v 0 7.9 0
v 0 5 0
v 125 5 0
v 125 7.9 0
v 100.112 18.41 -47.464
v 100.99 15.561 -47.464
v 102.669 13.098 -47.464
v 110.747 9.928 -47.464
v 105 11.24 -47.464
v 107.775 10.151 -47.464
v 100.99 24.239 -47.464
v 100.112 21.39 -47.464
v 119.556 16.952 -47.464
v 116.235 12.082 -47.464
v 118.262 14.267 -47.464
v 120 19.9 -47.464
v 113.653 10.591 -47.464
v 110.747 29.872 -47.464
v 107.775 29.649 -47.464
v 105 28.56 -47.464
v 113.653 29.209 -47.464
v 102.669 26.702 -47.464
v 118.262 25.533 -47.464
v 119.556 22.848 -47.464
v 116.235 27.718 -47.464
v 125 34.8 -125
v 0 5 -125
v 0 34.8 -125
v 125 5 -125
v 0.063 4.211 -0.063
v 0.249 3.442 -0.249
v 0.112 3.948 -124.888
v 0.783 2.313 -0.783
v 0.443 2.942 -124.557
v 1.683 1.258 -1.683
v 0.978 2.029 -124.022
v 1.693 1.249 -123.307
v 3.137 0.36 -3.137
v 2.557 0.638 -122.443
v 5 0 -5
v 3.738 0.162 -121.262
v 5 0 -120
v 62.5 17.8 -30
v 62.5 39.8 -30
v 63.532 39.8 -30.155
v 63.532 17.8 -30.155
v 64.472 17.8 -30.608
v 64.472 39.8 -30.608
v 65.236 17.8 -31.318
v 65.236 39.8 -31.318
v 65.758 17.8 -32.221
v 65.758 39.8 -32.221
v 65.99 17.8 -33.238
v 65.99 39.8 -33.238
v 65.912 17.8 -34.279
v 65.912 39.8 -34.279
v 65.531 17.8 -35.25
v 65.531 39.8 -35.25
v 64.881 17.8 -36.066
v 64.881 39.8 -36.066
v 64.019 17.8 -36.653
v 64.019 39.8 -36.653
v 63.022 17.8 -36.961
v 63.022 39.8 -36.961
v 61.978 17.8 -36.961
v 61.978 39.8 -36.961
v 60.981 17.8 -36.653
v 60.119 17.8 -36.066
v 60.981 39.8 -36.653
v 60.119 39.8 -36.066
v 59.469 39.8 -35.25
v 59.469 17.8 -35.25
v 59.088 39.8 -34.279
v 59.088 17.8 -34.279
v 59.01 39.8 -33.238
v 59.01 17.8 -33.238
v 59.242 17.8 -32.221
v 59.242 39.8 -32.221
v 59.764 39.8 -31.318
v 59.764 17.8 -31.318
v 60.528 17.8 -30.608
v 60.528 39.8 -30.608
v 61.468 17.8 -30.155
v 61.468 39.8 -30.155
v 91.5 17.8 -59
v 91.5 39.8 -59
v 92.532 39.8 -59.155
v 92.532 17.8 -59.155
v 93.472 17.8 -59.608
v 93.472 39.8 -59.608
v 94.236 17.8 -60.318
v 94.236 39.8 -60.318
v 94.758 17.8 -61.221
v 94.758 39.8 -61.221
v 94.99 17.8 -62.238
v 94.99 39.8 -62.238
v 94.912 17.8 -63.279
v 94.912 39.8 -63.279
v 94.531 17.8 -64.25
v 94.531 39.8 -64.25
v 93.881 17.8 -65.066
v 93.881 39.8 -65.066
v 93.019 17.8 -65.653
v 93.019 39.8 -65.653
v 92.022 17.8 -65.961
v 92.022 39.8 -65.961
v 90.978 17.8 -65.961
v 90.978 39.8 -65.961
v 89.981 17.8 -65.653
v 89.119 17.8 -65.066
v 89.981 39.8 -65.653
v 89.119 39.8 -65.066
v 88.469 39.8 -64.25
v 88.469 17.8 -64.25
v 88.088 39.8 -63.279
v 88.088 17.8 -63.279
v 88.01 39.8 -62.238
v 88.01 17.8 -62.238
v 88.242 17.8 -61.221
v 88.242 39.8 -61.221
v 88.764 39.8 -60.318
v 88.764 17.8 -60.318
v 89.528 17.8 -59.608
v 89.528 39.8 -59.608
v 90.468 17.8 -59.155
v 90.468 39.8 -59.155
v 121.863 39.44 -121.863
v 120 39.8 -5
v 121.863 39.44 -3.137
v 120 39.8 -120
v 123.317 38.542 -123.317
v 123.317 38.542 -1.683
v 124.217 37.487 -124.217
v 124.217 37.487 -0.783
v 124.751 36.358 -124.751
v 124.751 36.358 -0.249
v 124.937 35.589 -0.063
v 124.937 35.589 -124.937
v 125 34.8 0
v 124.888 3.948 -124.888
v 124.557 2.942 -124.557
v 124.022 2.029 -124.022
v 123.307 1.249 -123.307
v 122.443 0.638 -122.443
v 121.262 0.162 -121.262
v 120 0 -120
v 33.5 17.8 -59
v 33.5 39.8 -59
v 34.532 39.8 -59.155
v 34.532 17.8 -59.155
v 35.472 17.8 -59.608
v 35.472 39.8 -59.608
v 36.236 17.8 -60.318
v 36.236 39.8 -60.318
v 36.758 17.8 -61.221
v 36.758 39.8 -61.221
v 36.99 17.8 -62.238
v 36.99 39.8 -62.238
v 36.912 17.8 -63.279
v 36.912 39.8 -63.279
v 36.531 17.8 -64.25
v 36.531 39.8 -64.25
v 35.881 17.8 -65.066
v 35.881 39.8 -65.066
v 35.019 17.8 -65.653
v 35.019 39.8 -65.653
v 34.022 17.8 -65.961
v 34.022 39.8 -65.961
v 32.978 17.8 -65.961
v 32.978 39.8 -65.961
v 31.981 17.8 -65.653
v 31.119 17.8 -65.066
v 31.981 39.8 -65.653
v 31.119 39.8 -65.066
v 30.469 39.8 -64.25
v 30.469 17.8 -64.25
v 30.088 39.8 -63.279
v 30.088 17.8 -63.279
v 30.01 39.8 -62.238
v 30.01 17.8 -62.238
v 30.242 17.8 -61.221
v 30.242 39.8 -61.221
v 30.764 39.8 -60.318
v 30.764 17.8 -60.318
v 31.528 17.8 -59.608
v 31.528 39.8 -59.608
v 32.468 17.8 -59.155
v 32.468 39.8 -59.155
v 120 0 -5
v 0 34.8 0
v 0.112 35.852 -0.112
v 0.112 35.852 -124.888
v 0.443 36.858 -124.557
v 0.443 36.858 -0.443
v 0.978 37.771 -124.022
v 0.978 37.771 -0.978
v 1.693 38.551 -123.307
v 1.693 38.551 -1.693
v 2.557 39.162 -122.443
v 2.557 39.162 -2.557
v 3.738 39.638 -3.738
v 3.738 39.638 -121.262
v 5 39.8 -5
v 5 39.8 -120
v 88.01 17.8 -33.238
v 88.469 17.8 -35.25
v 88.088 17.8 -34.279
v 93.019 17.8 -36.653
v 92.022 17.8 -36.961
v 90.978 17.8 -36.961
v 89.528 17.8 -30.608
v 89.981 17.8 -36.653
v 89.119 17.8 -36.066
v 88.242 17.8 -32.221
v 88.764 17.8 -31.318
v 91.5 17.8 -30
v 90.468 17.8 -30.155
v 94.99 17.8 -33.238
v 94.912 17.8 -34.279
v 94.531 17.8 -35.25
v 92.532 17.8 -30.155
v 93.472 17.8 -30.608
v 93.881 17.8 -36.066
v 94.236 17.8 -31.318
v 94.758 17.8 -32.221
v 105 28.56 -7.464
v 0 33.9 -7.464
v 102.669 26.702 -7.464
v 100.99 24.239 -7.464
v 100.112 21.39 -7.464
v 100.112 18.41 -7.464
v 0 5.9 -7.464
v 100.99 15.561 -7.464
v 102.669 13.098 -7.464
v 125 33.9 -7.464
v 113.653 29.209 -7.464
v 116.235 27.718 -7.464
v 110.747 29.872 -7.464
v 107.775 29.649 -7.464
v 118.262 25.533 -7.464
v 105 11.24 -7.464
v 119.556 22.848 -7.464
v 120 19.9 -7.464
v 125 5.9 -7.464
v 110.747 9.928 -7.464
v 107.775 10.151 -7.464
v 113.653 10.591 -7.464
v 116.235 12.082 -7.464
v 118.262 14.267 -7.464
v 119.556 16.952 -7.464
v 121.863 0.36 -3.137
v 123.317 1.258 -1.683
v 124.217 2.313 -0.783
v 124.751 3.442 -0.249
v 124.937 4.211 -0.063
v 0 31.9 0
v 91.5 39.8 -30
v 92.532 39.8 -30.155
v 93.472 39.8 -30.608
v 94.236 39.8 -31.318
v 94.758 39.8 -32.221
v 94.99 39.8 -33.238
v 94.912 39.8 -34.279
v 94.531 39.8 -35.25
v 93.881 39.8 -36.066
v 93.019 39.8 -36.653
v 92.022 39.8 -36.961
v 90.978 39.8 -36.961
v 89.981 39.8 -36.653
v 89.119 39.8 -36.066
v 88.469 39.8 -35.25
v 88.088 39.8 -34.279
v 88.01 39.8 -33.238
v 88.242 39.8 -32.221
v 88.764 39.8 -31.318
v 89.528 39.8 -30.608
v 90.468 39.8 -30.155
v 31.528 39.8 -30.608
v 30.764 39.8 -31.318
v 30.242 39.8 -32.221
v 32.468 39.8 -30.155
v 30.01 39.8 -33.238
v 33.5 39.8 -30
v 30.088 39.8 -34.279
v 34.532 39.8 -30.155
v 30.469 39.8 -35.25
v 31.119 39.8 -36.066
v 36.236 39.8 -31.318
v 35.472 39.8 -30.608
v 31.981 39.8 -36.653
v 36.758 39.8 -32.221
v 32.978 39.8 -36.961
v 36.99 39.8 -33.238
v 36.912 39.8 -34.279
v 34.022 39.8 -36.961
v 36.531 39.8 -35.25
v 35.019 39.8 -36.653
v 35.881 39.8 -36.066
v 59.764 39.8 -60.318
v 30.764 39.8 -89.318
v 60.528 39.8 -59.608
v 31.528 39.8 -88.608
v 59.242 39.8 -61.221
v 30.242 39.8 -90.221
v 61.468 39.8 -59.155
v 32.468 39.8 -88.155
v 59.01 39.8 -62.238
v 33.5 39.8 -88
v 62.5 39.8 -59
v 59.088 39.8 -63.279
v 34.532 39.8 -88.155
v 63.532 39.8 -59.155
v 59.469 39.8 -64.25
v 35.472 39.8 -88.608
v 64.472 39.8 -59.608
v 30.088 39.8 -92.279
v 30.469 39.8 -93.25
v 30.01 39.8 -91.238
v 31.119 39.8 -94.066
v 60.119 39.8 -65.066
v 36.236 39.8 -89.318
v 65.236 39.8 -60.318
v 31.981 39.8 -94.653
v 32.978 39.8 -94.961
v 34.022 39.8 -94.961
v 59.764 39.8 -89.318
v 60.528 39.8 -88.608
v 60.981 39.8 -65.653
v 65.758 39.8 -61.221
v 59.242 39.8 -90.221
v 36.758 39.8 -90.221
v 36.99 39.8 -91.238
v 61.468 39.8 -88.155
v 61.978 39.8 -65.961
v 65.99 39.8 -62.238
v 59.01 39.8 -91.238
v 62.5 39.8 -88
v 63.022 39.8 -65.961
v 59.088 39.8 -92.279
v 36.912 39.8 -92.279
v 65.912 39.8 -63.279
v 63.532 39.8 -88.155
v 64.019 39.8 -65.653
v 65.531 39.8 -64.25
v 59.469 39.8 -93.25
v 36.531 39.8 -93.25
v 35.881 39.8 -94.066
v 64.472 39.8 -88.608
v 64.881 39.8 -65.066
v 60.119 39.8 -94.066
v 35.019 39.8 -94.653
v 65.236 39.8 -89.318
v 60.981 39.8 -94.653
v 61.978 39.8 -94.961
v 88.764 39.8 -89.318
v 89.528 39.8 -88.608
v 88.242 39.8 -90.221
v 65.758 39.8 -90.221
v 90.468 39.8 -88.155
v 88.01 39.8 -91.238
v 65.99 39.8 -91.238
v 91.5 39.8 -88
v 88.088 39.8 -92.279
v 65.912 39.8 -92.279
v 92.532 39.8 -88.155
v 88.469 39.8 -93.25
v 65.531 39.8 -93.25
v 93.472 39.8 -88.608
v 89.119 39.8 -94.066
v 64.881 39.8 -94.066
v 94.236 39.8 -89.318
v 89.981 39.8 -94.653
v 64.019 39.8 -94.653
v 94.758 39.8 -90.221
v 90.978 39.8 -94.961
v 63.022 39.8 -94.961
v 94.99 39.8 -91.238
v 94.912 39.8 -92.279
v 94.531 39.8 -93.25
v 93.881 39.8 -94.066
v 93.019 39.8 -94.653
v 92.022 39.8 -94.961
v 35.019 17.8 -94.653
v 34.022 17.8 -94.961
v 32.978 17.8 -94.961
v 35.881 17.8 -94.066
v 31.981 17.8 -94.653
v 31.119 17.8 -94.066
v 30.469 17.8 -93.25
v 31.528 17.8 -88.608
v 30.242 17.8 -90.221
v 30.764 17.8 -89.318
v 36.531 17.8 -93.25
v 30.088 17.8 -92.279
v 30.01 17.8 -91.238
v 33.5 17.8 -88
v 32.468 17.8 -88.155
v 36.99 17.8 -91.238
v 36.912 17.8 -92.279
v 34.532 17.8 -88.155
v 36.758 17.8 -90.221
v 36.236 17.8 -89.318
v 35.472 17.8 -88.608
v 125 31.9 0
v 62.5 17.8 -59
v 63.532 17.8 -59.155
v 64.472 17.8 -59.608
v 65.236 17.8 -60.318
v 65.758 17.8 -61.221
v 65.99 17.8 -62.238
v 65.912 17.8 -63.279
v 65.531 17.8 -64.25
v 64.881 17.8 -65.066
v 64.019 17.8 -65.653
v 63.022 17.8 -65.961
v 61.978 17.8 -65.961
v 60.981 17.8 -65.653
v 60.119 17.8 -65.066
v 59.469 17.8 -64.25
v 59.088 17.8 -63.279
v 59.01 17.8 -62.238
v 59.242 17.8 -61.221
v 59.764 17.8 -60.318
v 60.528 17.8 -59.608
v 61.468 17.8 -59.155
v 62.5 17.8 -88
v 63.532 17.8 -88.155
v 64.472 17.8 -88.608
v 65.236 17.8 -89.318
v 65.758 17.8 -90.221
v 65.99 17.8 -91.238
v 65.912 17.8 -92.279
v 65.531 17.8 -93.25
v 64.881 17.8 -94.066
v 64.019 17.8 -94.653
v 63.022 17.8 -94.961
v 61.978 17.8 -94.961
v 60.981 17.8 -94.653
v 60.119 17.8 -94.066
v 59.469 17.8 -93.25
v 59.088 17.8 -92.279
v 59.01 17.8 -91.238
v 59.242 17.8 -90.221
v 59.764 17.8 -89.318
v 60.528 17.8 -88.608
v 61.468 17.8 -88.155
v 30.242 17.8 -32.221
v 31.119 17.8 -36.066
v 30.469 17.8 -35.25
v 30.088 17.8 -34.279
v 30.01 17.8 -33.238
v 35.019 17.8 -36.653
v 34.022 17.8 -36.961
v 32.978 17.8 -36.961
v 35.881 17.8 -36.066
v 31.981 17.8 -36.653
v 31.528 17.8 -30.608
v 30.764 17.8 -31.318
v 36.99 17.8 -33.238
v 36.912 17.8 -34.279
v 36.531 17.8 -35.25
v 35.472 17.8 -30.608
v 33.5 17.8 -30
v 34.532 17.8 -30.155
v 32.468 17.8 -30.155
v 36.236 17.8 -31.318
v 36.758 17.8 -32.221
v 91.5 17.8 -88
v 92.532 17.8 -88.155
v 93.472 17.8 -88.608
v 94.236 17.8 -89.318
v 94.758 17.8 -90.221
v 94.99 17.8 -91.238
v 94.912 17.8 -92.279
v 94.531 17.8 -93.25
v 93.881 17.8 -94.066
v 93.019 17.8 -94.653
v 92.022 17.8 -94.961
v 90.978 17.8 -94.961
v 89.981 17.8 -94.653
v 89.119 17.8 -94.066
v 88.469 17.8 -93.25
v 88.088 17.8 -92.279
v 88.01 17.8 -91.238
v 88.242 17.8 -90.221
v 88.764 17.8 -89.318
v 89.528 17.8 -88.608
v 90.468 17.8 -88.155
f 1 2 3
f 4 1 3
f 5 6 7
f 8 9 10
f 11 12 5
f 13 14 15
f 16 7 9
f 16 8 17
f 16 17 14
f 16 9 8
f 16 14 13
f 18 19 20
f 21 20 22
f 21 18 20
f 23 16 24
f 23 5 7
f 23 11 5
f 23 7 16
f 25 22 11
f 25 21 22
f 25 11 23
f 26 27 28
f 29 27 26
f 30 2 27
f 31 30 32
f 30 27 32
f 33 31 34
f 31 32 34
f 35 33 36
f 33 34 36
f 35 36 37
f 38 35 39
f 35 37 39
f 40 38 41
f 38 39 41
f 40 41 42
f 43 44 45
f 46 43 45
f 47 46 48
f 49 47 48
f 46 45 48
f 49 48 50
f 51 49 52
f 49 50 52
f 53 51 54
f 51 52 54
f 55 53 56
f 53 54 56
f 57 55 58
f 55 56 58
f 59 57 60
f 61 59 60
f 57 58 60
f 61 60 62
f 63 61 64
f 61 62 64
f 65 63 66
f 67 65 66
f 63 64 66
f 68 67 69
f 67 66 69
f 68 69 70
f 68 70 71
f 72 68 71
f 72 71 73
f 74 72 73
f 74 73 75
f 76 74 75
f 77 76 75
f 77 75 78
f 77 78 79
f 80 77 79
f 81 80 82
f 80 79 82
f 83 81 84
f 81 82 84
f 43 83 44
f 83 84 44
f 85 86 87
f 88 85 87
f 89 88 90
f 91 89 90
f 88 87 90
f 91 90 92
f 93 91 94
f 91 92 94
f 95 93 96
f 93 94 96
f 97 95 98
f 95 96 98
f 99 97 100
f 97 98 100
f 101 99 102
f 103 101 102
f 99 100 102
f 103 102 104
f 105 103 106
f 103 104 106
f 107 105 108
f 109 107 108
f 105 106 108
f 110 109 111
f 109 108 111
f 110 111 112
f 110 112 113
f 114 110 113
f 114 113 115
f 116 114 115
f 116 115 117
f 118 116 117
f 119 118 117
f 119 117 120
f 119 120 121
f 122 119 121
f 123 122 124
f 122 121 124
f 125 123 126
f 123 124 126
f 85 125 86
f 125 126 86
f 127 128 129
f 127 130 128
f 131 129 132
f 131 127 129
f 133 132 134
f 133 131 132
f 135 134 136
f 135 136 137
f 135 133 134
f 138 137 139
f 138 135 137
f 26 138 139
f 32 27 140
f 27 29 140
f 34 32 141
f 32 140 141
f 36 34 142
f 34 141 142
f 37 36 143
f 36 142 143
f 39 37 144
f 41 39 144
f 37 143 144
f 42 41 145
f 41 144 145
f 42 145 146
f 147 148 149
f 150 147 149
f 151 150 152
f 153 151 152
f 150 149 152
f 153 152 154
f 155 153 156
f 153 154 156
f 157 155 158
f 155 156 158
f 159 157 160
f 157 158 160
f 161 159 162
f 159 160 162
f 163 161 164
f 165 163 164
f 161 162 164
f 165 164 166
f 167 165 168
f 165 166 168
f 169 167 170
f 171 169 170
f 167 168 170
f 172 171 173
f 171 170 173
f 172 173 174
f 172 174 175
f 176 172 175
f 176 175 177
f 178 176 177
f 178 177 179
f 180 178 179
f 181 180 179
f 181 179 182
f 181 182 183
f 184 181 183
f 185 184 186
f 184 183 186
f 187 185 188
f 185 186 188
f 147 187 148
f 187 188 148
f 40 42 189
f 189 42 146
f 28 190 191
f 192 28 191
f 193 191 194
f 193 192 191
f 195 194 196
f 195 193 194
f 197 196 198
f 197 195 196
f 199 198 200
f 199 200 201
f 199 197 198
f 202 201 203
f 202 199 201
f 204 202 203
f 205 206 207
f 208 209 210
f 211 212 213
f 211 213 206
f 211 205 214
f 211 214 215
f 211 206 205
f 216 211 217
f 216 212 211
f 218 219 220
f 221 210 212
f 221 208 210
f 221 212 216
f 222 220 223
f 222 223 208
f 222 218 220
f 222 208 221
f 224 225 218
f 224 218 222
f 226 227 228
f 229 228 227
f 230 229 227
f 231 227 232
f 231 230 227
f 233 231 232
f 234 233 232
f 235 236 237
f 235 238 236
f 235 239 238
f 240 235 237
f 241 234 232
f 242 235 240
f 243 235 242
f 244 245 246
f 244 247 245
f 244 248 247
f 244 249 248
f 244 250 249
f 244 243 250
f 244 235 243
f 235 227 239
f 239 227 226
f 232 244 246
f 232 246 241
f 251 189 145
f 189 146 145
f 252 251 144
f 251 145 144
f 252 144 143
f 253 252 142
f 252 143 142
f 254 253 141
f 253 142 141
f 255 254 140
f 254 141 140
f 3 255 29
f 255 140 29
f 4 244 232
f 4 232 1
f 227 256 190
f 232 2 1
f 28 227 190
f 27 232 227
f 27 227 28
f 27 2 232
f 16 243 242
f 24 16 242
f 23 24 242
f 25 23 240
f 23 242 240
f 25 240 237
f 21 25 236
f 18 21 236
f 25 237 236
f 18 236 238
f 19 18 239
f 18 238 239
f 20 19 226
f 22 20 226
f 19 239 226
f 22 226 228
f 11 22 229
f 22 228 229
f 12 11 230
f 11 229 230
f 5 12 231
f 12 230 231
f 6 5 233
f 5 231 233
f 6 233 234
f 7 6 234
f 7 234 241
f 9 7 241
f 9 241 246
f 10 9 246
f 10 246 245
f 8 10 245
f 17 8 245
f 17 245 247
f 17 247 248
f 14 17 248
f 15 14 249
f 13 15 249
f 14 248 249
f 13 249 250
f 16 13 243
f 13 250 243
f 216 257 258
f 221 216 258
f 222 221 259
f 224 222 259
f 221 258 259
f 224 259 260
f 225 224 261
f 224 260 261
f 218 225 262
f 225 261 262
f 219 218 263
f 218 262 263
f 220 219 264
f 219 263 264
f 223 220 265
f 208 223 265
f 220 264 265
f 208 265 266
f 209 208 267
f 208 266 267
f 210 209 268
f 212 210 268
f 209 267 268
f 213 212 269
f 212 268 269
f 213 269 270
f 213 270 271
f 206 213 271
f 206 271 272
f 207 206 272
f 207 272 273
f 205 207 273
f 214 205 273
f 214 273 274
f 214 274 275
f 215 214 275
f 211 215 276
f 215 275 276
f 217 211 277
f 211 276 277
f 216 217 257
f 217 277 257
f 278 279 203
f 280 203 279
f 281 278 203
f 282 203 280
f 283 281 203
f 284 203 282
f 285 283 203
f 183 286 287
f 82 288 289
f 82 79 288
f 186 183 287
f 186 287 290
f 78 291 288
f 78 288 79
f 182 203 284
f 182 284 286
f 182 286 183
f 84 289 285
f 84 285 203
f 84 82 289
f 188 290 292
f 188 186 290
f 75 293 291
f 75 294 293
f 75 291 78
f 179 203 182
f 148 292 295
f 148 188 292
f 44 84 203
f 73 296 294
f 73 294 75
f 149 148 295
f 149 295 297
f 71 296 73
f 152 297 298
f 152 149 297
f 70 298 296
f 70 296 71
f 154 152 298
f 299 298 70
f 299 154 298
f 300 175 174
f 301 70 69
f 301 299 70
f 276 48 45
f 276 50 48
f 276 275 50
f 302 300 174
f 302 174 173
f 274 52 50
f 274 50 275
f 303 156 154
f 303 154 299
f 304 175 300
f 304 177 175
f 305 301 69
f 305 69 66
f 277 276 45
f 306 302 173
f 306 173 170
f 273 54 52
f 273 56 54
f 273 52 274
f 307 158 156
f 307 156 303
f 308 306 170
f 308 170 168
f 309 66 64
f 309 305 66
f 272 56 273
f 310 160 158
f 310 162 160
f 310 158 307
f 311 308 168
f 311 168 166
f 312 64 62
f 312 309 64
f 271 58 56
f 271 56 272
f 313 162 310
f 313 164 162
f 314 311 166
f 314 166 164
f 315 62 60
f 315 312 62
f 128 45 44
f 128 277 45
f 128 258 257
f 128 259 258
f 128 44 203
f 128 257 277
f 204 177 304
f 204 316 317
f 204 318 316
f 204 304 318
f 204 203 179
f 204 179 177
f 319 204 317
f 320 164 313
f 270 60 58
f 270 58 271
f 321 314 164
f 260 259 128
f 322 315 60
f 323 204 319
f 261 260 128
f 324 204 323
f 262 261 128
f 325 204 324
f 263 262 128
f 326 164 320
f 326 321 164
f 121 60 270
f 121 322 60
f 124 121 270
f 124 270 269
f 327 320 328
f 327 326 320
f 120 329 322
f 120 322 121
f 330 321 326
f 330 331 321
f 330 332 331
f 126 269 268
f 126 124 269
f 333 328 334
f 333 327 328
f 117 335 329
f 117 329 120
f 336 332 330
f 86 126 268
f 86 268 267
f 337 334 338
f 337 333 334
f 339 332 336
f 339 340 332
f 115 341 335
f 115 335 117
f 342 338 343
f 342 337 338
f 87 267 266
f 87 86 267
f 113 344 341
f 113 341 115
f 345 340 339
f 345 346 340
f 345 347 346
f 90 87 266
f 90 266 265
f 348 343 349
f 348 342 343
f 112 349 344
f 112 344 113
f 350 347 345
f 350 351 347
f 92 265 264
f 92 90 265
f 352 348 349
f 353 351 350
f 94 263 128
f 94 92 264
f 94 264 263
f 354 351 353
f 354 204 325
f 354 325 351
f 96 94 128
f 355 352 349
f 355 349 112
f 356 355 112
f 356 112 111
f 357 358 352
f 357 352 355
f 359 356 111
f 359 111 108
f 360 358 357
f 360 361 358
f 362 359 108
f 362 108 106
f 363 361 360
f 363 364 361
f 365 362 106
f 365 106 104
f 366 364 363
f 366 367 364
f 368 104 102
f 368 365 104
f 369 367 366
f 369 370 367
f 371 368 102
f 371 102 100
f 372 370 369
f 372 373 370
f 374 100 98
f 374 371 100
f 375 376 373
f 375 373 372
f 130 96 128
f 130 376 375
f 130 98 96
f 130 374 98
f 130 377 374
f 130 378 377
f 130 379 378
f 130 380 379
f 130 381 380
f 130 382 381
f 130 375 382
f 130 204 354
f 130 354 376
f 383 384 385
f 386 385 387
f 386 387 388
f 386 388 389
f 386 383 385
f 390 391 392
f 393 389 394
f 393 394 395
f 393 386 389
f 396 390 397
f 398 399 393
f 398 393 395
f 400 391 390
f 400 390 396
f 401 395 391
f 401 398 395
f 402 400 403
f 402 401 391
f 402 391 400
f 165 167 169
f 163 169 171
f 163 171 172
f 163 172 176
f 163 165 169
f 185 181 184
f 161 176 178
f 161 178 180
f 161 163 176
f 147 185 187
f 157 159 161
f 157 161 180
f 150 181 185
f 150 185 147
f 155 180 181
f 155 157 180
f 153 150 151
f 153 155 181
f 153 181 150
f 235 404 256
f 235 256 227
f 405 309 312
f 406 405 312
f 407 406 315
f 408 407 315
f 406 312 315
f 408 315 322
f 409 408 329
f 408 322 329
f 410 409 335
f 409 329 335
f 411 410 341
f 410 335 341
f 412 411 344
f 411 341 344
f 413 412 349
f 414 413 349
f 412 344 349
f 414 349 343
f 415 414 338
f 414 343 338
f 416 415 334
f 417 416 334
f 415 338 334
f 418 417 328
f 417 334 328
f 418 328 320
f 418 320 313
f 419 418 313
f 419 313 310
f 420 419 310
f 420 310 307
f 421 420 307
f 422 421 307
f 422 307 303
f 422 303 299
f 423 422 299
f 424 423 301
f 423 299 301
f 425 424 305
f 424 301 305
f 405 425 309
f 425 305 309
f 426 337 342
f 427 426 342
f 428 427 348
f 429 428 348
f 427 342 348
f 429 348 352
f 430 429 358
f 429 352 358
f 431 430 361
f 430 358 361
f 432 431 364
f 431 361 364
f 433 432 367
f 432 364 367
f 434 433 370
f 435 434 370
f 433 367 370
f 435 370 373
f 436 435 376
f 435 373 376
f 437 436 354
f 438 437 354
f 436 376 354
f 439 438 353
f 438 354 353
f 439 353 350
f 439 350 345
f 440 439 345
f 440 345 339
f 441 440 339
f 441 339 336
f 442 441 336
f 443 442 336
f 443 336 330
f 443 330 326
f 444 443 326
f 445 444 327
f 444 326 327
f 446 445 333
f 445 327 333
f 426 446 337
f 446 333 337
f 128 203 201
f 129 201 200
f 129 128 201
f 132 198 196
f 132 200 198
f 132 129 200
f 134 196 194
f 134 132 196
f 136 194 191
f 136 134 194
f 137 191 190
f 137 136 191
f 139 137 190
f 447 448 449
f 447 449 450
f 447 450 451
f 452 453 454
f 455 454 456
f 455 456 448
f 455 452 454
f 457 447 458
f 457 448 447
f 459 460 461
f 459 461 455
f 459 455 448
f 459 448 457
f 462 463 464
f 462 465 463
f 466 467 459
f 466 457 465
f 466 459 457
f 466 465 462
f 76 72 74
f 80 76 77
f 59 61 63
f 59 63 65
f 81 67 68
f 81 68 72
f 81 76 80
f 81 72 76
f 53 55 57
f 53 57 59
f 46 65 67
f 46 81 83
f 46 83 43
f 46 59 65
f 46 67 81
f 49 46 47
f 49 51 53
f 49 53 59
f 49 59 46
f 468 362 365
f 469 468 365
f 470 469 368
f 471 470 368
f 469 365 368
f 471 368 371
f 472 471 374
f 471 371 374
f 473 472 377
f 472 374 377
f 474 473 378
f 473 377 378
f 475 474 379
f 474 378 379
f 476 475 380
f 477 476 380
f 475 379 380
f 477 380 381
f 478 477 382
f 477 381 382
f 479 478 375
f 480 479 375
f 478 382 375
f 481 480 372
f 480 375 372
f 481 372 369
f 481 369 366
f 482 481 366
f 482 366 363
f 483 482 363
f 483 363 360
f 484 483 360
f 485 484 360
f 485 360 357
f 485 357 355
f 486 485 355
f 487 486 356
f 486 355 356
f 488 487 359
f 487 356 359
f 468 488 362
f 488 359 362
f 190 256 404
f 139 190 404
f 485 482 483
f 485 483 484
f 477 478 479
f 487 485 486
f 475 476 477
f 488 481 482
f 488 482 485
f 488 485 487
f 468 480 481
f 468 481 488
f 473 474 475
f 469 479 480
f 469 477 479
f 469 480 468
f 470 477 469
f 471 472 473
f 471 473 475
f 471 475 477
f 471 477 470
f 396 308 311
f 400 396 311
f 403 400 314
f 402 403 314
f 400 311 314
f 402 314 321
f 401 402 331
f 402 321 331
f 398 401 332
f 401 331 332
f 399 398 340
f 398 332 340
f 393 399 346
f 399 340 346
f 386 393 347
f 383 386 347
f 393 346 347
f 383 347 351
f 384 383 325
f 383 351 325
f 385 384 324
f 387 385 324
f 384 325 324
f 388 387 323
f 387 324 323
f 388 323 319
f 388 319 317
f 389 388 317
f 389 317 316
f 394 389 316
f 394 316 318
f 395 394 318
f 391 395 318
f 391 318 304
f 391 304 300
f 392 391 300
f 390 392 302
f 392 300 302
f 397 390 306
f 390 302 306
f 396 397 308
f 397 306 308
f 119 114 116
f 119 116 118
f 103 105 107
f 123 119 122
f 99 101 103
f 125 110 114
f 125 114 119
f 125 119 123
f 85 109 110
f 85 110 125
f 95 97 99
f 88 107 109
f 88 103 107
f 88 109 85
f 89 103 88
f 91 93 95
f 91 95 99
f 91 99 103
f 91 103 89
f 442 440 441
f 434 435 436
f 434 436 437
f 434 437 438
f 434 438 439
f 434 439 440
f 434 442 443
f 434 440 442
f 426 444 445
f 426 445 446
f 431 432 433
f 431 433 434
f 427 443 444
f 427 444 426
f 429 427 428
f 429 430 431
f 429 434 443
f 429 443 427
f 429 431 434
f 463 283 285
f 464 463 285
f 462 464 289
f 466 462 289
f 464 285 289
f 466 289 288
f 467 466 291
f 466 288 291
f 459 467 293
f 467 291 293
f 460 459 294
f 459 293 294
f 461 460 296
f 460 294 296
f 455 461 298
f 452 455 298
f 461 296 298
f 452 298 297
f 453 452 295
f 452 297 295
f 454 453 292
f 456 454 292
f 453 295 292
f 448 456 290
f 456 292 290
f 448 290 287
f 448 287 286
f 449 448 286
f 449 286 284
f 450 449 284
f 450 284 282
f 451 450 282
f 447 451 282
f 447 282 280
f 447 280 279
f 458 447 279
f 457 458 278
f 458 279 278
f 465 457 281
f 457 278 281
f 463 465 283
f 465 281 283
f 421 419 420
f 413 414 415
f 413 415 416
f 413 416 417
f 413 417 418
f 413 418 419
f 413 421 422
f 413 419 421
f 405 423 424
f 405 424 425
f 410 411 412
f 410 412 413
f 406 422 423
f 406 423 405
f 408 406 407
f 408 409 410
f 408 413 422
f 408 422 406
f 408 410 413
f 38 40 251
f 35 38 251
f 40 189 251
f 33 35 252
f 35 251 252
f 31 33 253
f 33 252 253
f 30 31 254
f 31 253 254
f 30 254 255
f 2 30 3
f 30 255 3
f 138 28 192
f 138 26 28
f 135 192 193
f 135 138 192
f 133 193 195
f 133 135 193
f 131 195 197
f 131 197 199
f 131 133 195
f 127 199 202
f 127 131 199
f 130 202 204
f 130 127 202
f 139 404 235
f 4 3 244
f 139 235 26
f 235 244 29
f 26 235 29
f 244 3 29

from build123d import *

# Parameters (mm, degrees)
SKETCH1_W           = 125
SKETCH1_H           = 125
BOSS_EXTRUDE1_DEPTH = 39.8
CUT_EXTRUDE1_DEPTH  = 132.8
SKETCH3_R           = 10
CUT_EXTRUDE2_DEPTH  = 40
FILLET1_R           = 5
FILLET2_R           = 5
SKETCH4_R           = 3.5
CUT_EXTRUDE3_DEPTH  = 22


with BuildPart() as part:
    # Sketch1 → Boss-Extrude1 (new body)
    with BuildSketch(Plane(origin=(0, 0, 0), x_dir=(1, 0, 0), z_dir=(0, 1, 0))):
        with Locations((62.5, 62.5)):
            Rectangle(SKETCH1_W, SKETCH1_H)
    extrude(amount=BOSS_EXTRUDE1_DEPTH)

    # Sketch2 → Cut-Extrude1 (cut)
    with BuildSketch(Plane(origin=(125, 0, 0), x_dir=(0, 0, -1), z_dir=(1, 0, 0))):
        Polygon((0, 31.9), (7.464101615, 33.9), (7.464101615, 5.9), (0, 7.9), align=None)
    extrude(amount=-CUT_EXTRUDE1_DEPTH, mode=Mode.SUBTRACT)

    # Sketch3 → Cut-Extrude2 (cut)
    with BuildSketch(Plane.XY.offset(-7.464101615)):
        with Locations((110, 19.9)):
            Circle(SKETCH3_R)
    extrude(amount=-CUT_EXTRUDE2_DEPTH, mode=Mode.SUBTRACT)

    # Fillet1
    fillet1_edges = [part.edges().sort_by_distance(p)[0] for p in [
        (125, 39.8, -62.5),
        (62.5, 39.8, -125),
        (0, 39.8, -62.5),
        (62.5, 39.8, 0),
    ]]
    fillet(fillet1_edges, radius=FILLET1_R)

    # Fillet2
    fillet2_edges = [part.edges().sort_by_distance(p)[0] for p in [
        (62.5, 0, -125),
        (125, 0, -62.5),
        (62.5, 0, 0),
        (0, 0, -62.5),
    ]]
    fillet(fillet2_edges, radius=FILLET2_R)

    # Sketch4 → Cut-Extrude3 (cut)
    with BuildSketch(Plane(origin=(0, 39.8, 0), x_dir=(1, 0, 0), z_dir=(0, 1, 0))):
        with Locations(Location((33.5, 91.5, 0), (0, 0, 270))):
            Circle(SKETCH4_R)
        with Locations(Location((62.5, 91.5, 0), (0, 0, 270))):
            Circle(SKETCH4_R)
        with Locations(Location((91.5, 91.5, 0), (0, 0, 270))):
            Circle(SKETCH4_R)
        with Locations(Location((33.5, 62.5, 0), (0, 0, 270))):
            Circle(SKETCH4_R)
        with Locations(Location((62.5, 62.5, 0), (0, 0, 270))):
            Circle(SKETCH4_R)
        with Locations(Location((91.5, 62.5, 0), (0, 0, 270))):
            Circle(SKETCH4_R)
        with Locations(Location((33.5, 33.5, 0), (0, 0, 270))):
            Circle(SKETCH4_R)
        with Locations(Location((62.5, 33.5, 0), (0, 0, 270))):
            Circle(SKETCH4_R)
        with Locations(Location((91.5, 33.5, 0), (0, 0, 270))):
            Circle(SKETCH4_R)
    extrude(amount=-CUT_EXTRUDE3_DEPTH, mode=Mode.SUBTRACT)


solid = part.part
